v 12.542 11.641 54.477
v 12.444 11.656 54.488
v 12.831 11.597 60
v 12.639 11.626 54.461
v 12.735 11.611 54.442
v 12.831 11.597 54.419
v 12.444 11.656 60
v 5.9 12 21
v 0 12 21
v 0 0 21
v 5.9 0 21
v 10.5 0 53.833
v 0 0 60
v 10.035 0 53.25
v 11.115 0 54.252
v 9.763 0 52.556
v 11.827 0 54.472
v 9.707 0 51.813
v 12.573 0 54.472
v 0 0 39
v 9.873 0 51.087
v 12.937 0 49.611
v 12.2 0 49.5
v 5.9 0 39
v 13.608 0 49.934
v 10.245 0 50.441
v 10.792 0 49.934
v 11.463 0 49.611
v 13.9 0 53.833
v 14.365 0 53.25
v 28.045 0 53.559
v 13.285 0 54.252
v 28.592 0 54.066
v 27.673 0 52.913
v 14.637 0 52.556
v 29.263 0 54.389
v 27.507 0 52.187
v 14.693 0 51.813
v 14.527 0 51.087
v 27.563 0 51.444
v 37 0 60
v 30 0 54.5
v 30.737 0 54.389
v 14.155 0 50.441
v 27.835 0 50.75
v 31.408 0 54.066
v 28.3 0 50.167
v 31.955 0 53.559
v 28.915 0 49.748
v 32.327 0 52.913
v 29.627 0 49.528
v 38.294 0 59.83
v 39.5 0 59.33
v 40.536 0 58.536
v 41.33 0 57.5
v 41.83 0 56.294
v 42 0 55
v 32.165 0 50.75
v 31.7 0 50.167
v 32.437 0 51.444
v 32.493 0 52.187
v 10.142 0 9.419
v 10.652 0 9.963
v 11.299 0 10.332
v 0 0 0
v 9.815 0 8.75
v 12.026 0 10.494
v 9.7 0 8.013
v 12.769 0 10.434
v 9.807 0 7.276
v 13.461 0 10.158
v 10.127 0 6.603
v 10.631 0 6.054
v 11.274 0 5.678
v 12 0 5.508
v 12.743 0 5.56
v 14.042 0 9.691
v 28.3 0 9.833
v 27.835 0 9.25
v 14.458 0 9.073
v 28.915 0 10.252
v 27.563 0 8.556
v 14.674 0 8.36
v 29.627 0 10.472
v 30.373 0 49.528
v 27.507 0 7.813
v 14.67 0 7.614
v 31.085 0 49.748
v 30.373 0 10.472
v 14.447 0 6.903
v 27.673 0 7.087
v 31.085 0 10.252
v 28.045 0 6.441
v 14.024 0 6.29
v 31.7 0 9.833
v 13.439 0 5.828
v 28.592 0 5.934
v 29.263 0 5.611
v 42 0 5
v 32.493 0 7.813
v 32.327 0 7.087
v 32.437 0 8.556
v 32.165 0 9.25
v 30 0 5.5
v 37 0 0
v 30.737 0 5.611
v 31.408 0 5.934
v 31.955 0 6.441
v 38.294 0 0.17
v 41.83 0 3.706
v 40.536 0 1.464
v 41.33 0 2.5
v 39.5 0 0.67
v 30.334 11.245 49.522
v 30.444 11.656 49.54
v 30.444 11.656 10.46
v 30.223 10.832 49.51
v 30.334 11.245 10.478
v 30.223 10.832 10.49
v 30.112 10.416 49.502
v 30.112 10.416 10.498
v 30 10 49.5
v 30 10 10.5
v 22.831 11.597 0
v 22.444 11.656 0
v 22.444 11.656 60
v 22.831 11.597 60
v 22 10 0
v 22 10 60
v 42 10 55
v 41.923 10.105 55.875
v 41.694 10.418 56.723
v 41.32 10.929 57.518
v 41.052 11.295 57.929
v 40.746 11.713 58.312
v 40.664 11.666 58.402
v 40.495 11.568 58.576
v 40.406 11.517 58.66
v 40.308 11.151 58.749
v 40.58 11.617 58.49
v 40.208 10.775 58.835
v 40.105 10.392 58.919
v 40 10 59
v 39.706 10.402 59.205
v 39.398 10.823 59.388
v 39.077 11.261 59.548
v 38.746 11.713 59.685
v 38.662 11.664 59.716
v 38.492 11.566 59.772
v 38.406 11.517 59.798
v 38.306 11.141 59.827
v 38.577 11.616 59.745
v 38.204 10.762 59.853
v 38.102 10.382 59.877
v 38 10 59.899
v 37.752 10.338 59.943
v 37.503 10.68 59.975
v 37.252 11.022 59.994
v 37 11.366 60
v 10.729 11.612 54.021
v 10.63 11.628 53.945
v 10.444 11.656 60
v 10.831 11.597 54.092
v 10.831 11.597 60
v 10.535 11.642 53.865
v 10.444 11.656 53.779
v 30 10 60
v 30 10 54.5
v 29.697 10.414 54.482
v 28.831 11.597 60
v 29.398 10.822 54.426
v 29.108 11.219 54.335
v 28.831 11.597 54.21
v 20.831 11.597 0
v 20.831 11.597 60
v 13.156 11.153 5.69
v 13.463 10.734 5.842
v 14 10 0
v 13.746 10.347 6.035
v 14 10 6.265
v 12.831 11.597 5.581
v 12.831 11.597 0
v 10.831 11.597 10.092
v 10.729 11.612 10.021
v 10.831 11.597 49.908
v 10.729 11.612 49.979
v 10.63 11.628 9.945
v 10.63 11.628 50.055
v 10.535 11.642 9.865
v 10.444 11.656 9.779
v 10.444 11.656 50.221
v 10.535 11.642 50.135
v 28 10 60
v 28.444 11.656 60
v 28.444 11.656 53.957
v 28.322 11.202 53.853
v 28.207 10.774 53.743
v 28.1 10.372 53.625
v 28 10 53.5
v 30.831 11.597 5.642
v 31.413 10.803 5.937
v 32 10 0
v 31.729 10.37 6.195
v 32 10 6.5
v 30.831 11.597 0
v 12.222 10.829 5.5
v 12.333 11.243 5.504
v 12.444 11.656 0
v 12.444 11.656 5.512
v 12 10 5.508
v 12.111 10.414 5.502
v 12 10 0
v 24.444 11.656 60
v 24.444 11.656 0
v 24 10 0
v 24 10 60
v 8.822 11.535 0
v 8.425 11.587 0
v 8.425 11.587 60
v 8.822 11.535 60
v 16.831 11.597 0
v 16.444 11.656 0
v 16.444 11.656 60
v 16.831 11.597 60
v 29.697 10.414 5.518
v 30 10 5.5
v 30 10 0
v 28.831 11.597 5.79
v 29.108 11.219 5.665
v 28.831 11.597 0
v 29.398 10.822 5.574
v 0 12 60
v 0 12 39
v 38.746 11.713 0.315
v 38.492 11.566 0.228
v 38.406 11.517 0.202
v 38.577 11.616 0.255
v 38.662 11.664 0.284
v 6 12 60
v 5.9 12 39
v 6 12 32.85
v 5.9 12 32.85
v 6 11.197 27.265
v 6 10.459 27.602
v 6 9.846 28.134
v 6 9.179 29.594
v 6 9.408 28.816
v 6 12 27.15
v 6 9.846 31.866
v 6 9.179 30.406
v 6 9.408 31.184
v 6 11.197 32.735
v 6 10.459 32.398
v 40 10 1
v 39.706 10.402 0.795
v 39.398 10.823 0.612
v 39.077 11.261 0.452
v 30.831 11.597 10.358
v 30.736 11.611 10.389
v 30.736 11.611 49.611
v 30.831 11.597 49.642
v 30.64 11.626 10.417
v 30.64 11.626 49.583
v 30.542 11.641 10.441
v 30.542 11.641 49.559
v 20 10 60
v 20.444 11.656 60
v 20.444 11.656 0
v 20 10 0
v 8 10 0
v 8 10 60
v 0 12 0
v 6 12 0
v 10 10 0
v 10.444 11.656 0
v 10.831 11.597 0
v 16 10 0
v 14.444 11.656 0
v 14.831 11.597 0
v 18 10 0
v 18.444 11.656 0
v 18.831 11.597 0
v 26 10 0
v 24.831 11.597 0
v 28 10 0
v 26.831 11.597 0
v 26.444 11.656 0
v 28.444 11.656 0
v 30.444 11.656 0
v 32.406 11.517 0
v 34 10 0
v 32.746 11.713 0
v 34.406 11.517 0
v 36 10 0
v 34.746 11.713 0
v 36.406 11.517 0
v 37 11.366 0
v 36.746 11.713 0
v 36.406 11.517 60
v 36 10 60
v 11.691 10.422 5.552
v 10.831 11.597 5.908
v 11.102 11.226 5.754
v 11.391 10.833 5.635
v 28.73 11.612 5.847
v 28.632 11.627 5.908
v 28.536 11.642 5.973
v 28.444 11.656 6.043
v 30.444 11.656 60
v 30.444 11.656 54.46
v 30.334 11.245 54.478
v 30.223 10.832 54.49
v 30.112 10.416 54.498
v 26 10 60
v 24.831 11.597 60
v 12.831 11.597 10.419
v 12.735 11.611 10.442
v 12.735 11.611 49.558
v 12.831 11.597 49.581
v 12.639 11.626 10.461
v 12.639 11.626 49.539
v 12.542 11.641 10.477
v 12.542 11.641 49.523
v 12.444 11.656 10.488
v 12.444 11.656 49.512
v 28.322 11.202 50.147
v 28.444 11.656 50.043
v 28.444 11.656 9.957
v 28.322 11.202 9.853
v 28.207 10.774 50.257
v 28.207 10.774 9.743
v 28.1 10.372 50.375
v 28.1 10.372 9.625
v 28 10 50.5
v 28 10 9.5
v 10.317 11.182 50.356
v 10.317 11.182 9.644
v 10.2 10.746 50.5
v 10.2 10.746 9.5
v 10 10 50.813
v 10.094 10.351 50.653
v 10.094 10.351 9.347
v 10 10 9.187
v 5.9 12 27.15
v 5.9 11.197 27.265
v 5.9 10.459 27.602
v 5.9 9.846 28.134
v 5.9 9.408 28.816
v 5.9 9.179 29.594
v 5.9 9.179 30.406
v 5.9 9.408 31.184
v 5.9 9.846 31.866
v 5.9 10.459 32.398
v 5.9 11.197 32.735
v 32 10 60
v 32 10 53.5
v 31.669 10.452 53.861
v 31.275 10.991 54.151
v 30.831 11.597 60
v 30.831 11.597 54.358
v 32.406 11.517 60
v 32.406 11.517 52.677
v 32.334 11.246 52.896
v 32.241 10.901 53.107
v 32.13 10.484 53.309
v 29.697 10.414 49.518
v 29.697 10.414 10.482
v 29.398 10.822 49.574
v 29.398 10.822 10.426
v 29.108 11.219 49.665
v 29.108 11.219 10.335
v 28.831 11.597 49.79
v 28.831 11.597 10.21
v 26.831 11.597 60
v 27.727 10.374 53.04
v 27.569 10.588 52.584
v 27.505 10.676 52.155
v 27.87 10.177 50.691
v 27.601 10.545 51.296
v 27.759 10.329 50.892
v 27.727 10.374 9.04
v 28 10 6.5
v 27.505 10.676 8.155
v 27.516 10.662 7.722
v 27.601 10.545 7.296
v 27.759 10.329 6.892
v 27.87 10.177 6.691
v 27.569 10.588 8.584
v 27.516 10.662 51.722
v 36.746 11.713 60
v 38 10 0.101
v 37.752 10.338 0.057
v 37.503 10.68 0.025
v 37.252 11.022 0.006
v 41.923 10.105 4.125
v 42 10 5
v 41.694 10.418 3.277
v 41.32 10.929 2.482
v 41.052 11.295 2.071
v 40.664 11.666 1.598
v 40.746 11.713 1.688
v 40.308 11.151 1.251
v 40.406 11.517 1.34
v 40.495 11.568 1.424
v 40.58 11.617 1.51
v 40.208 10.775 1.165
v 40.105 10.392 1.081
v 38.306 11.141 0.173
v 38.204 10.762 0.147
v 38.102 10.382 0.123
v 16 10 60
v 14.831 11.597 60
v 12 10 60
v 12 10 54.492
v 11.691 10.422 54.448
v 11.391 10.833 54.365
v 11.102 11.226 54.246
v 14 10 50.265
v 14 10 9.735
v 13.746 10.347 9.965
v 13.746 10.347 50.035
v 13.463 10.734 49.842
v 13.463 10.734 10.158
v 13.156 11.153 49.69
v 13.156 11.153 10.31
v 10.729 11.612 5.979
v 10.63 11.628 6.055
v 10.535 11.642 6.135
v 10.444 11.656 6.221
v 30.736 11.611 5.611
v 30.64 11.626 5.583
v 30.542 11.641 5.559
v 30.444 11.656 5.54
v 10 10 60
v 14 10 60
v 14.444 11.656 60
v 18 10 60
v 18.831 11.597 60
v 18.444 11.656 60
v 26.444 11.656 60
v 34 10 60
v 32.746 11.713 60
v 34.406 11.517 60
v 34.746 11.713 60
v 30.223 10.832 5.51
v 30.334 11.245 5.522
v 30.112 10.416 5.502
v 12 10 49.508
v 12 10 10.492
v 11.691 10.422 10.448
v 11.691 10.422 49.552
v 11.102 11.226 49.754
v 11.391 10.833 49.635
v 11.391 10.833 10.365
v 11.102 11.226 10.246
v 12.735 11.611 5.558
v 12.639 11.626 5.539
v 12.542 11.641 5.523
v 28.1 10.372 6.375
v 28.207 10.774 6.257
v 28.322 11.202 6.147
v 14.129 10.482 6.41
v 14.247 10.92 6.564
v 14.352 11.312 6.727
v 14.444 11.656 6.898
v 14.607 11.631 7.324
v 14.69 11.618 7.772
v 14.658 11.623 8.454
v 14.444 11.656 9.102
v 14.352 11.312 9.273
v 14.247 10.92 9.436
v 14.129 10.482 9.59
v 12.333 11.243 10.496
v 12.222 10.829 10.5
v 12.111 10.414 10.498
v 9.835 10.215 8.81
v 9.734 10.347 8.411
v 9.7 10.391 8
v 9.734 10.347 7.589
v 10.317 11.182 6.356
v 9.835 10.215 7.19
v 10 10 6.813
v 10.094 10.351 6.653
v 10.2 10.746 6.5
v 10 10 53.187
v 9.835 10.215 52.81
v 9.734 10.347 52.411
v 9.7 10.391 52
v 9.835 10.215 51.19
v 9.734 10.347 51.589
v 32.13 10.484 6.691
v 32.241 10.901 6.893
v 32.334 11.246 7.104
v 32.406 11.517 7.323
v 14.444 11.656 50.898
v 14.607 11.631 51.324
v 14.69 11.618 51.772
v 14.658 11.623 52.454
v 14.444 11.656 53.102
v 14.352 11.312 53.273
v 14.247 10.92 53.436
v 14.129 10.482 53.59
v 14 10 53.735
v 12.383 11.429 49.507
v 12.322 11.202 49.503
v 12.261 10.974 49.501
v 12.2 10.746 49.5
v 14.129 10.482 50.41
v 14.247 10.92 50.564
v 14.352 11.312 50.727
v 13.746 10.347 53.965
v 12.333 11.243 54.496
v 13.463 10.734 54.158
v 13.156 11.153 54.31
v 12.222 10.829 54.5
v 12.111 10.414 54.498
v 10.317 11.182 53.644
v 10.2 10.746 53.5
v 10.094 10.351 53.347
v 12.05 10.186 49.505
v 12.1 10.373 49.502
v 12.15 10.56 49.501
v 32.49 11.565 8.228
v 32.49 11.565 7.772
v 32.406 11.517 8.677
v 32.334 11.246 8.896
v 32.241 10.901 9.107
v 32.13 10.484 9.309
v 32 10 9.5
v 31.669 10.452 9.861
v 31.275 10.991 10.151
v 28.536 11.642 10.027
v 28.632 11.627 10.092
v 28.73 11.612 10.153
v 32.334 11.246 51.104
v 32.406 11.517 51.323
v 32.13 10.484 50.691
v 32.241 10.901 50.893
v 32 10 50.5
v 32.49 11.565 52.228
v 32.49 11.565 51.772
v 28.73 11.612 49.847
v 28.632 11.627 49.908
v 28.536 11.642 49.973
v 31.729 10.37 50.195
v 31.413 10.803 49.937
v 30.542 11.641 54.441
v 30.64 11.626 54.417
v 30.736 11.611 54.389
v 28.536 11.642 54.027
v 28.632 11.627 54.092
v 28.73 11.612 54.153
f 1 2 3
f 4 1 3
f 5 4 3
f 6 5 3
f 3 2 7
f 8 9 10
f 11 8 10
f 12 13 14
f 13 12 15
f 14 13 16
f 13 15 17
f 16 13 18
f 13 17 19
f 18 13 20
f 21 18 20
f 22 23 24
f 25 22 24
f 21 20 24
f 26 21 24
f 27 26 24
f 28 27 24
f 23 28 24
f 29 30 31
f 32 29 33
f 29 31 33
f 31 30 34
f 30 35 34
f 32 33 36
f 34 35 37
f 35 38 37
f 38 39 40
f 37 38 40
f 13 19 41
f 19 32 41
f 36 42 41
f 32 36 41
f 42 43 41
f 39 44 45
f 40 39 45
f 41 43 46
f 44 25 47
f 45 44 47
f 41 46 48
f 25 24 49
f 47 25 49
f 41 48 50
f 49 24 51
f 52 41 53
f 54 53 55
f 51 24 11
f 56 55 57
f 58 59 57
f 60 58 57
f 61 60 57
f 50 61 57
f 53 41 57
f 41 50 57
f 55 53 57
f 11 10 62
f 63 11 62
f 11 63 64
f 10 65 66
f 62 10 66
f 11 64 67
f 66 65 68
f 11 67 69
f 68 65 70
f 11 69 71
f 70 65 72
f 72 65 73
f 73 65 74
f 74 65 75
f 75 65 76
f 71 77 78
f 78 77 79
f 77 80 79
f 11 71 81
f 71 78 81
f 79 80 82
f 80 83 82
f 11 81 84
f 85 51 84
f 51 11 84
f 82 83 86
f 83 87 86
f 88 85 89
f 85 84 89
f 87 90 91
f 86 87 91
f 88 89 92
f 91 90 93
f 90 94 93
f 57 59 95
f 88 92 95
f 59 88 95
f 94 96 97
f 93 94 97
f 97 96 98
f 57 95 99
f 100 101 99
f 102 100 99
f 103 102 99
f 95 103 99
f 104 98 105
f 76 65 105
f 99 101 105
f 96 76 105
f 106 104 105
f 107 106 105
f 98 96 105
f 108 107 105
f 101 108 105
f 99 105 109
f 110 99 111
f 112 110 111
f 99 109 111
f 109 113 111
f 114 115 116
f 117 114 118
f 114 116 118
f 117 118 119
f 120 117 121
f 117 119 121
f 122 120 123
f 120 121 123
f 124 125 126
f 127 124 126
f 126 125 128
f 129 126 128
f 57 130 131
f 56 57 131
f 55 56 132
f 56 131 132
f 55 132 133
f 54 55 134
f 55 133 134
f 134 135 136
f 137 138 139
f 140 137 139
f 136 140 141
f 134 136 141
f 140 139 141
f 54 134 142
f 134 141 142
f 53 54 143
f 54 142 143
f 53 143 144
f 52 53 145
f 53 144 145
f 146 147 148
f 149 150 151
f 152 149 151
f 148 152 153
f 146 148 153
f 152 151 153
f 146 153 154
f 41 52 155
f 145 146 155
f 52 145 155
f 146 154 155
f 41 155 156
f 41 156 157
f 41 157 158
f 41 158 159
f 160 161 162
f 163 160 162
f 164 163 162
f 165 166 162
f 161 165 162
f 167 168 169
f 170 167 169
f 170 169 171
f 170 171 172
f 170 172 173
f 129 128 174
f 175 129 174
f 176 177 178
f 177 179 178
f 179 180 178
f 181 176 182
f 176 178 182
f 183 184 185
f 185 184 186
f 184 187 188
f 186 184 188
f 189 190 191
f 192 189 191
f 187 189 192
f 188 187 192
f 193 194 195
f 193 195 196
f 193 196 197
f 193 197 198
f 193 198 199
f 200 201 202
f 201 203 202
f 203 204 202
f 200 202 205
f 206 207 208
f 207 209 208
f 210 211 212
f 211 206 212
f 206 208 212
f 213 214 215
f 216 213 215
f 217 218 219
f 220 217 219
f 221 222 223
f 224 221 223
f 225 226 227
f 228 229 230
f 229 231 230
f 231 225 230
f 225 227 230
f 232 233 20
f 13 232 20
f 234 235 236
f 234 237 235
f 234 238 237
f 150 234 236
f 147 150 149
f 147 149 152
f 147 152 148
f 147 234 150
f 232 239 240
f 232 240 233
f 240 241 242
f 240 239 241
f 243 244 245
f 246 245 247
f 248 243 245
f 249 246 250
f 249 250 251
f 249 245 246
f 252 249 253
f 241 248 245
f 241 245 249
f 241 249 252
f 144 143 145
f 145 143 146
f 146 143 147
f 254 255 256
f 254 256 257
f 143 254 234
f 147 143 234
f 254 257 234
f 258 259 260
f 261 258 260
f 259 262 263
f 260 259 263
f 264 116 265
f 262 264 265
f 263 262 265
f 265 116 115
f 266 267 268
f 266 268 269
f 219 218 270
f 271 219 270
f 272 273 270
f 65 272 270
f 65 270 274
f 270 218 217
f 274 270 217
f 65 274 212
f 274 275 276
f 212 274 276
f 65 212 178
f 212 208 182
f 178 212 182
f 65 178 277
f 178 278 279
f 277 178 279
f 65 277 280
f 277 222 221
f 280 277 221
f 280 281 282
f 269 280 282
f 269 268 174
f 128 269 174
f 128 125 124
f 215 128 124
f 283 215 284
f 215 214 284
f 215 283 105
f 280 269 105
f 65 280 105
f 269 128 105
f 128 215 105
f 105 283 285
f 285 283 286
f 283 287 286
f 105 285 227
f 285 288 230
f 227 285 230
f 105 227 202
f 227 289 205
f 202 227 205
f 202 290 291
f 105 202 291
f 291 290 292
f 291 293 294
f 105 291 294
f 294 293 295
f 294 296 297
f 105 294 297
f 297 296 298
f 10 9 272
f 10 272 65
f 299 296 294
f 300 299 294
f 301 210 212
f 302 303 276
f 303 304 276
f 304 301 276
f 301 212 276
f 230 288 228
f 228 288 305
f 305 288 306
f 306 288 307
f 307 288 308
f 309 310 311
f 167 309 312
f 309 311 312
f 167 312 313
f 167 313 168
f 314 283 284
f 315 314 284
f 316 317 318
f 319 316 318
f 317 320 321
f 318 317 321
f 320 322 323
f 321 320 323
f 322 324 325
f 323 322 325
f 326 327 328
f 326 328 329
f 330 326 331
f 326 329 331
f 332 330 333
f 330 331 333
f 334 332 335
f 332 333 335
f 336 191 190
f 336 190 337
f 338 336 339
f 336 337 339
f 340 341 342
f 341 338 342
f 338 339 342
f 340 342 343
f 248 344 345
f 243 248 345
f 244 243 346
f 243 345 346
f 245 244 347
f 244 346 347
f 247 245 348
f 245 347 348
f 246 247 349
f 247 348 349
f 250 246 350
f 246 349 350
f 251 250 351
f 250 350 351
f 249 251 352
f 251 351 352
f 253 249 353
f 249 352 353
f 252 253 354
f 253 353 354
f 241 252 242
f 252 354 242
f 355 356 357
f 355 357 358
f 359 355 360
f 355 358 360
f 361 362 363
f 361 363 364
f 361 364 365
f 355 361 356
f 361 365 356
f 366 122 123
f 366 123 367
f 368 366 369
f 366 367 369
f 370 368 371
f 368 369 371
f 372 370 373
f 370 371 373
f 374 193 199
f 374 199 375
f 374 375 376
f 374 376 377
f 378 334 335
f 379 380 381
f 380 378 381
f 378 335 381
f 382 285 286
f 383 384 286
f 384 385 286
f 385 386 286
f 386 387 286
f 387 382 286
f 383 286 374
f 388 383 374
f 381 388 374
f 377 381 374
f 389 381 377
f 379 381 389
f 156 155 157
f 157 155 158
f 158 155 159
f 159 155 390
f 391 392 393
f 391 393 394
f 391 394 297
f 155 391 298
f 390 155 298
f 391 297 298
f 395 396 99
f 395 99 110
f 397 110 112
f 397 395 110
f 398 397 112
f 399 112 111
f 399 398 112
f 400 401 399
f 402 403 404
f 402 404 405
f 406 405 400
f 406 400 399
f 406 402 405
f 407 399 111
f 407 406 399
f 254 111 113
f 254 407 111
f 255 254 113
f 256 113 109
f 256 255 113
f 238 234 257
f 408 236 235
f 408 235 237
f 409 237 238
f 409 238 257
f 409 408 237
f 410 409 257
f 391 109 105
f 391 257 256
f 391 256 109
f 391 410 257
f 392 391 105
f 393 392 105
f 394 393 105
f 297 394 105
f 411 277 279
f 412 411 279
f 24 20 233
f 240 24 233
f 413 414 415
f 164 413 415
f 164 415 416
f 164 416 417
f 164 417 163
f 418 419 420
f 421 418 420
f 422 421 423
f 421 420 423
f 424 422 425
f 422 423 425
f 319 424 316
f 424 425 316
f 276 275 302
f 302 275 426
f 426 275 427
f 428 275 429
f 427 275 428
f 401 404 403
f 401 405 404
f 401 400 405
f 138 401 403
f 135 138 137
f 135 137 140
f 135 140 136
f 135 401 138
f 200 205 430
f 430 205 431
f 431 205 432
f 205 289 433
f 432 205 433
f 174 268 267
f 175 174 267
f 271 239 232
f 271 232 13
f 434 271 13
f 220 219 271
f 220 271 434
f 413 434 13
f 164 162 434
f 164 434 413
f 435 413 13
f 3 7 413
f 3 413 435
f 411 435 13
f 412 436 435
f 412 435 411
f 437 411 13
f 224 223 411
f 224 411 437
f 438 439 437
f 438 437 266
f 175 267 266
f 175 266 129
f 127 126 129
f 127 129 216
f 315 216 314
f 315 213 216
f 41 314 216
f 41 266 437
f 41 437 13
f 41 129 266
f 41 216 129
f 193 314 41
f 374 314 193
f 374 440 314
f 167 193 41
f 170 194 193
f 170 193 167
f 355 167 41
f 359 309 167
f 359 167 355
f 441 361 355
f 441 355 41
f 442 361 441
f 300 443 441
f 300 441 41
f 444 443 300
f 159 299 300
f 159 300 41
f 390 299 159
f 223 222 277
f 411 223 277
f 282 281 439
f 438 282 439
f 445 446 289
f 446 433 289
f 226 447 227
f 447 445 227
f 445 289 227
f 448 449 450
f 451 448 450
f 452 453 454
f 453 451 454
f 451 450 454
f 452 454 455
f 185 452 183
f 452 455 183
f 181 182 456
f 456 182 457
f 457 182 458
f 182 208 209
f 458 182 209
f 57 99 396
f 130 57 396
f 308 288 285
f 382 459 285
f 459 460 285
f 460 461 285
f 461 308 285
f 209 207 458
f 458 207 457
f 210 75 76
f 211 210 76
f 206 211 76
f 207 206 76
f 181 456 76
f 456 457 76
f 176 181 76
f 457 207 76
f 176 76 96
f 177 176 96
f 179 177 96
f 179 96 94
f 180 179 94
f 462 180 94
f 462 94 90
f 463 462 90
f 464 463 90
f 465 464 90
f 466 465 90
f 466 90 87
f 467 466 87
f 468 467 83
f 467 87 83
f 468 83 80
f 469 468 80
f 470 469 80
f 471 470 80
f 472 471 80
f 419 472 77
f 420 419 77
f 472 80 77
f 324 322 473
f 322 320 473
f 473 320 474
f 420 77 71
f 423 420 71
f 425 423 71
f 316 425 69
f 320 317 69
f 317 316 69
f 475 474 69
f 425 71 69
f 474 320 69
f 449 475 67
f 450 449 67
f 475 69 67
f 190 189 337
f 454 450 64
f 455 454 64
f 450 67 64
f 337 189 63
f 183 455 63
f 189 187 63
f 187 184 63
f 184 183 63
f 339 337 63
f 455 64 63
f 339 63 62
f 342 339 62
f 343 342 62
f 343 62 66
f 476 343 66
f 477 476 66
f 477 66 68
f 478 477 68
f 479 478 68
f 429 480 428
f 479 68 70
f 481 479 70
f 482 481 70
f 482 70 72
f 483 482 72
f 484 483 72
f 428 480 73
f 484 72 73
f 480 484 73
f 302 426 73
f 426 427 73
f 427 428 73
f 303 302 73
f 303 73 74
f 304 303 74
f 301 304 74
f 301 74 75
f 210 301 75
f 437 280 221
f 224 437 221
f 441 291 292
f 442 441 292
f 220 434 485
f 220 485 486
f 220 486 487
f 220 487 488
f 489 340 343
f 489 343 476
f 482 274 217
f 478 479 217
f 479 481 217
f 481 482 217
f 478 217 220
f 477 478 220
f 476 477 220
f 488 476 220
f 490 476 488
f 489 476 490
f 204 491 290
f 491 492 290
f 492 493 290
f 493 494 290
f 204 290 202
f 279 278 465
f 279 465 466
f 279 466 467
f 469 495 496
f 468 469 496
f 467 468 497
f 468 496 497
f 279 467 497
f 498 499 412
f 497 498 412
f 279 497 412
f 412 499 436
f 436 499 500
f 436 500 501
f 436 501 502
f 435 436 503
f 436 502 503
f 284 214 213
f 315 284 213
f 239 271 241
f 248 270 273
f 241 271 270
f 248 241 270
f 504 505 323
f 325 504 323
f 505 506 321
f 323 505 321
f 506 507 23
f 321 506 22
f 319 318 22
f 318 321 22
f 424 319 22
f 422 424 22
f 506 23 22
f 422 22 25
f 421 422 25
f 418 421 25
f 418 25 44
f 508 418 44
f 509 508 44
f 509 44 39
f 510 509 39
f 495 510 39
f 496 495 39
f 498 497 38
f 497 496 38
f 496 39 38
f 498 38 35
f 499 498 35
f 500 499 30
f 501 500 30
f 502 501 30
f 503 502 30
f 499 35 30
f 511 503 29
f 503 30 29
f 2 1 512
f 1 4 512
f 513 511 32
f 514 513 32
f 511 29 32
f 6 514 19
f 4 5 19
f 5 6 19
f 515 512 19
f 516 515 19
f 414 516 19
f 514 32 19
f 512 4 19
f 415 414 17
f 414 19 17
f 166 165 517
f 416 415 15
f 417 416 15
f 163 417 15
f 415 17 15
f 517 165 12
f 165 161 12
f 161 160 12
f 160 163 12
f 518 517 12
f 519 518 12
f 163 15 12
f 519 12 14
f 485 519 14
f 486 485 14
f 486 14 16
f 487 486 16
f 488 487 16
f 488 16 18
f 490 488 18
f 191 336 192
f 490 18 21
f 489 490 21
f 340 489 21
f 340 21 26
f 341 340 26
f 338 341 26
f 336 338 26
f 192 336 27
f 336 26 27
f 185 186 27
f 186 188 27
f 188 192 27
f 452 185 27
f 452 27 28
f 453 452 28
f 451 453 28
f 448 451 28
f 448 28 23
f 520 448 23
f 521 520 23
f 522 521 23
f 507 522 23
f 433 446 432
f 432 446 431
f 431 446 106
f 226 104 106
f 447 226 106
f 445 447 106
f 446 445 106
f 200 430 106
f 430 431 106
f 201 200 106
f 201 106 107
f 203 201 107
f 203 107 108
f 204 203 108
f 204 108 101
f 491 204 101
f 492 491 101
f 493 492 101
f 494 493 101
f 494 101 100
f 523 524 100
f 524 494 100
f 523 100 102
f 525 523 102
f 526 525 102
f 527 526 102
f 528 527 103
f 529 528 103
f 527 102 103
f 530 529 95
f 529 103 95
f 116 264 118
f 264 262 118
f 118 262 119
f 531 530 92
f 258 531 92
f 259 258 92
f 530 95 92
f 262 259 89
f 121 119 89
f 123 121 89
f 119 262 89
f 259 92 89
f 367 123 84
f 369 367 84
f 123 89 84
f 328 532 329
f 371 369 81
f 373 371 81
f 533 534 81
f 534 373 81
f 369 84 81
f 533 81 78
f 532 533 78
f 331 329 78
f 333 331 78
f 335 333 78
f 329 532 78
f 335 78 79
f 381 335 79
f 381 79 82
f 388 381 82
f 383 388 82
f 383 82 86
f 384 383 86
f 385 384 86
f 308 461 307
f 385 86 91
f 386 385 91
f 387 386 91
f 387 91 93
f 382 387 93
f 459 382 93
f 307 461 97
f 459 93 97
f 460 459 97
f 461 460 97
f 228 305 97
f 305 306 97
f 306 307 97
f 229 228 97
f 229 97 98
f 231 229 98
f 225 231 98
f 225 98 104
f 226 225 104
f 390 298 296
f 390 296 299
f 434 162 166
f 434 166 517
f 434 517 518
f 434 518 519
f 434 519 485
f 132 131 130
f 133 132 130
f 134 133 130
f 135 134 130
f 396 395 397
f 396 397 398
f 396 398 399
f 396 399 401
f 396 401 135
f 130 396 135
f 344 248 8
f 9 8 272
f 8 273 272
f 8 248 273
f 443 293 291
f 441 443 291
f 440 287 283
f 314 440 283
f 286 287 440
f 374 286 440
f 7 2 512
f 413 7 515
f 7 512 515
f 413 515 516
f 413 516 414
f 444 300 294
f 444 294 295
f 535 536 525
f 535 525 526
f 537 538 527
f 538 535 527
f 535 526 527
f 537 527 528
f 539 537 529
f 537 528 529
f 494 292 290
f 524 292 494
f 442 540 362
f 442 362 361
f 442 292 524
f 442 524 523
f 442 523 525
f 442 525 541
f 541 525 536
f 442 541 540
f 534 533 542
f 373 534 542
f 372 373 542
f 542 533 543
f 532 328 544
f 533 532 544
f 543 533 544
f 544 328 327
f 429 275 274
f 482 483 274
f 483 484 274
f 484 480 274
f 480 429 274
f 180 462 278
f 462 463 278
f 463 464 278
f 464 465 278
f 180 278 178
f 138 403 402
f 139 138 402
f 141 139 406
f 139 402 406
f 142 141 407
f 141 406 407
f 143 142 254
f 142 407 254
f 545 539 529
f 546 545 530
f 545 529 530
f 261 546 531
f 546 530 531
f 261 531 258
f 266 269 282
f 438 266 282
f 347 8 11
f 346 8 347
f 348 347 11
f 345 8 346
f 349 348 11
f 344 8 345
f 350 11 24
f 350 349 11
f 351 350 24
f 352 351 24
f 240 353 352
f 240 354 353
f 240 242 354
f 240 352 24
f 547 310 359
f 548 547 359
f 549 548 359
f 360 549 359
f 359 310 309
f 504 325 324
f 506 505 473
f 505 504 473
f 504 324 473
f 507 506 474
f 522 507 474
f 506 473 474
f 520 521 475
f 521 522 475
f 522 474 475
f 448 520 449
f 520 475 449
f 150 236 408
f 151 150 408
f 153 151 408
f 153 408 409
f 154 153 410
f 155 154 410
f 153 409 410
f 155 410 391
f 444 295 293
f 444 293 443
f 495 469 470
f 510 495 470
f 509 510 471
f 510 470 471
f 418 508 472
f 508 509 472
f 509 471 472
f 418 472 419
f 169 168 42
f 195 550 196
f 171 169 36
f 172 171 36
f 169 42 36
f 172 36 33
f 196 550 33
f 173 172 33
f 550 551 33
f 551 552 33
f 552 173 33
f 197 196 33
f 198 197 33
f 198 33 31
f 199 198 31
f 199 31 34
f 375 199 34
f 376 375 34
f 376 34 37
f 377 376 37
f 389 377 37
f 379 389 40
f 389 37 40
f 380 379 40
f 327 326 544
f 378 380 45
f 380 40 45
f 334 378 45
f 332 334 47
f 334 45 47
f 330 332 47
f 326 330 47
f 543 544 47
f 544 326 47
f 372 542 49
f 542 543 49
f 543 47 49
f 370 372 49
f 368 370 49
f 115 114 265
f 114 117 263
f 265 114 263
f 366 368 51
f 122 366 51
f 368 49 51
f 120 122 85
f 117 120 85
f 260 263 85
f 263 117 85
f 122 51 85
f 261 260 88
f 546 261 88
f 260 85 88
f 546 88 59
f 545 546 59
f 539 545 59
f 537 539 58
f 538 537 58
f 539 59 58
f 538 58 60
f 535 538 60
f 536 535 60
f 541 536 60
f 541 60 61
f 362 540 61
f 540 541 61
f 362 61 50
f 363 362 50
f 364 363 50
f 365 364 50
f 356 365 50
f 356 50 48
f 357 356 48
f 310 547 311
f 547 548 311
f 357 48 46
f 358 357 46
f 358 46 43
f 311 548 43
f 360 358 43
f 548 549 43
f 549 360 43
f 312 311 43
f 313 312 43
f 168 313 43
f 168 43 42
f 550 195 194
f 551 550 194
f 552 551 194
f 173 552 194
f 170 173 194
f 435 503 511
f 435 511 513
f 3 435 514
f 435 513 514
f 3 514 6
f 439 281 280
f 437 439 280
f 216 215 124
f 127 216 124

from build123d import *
from OCP.BRepFilletAPI import BRepFilletAPI_MakeChamfer

# Parameters (mm, degrees)
EXTRUDE_1_DEPTH     = 60
FILLET_1_R          = 5
CUT_EXTRUDE_1_DEPTH = 5.9
CHAMFER_1_SIZE      = 0.5
CHAMFER_1_SIZE2     = 0.355637567
CHAMFER_1_SIZE2_2   = 0.356604189
SKETCH_6_R          = 2.85
CUT_EXTRUDE_2_DEPTH = 0.1
SKETCH_7_R          = 2.5
CUT_EXTRUDE_3_DEPTH = 75.215901261


with BuildPart() as part:
    # 草图1 → 凸台-拉伸1 (new body)
    with BuildSketch(Plane.XY):
        Polygon((0, 0), (42, 0), (42, 10), (40.535898385, 12), (40, 10), (38.535898385, 12), (38, 10), (36.535898385, 12), (36, 10), (34.535898385, 12), (34, 10), (32.535898385, 12), (32, 10), (30.535898385, 12), (30, 10), (28.535898385, 12), (28, 10), (26.535898385, 12), (26, 10), (24.535898385, 12), (24, 10), (22.535898385, 12), (22, 10), (20.535898385, 12), (20, 10), (18.535898385, 12), (18, 10), (16.535898385, 12), (16, 10), (14.535898385, 12), (14, 10), (12.535898385, 12), (12, 10), (10.535898385, 12), (10, 10), (8.51763809, 11.931851653), (8, 10), (6, 12), (0, 12), align=None)
    extrude(amount=EXTRUDE_1_DEPTH)

    # 圆角1
    fillet_1_edges = [part.edges().sort_by_distance(p)[0] for p in [
        (42, 5, 0),
        (42, 5, 60),
    ]]
    fillet(fillet_1_edges, radius=FILLET_1_R)

    # 草图2 → 切除-拉伸1 (cut)
    with BuildSketch(Plane.ZY):
        with BuildLine():
            ThreePointArc((32.9, 12), (32.050609665, 9.949390335), (30, 9.1))
            Line((30, 9.1), (30, 0))
            Line((30, 0), (39, 0))
            Line((39, 0), (39, 12))
            Line((39, 12), (32.9, 12))
        make_face()
        with BuildLine():
            Line((30, 0), (30, 9.1))
            ThreePointArc((30, 9.1), (27.949390335, 9.949390335), (27.1, 12))
            Line((27.1, 12), (21, 12))
            Line((21, 12), (21, 0))
            Line((21, 0), (30, 0))
        make_face()
        with BuildLine():
            Line((32.9, 12), (30, 12))
            Line((30, 12), (30, 9.1))
            ThreePointArc((30, 9.1), (32.050609665, 9.949390335), (32.9, 12))
        make_face()
        with BuildLine():
            Line((30, 9.1), (30, 12))
            Line((30, 12), (27.1, 12))
            ThreePointArc((27.1, 12), (27.949390335, 9.949390335), (30, 9.1))
        make_face()
    extrude(amount=-CUT_EXTRUDE_1_DEPTH, mode=Mode.SUBTRACT)

    # 倒角1: one chamfer whose edges measure the first distance from different faces: ONE call of the kernel's chamfer builder (chamfer() names one face for all edges)
    chamfer_1_edges_1 = [part.edges().sort_by_distance(p)[0] for p in [
        (40.535898385, 12, 30),
    ]]
    chamfer_1_side_1 = [part.faces().sort_by_distance(p)[0] for p in [
        (40.267229154, 10.997312779, 30),
    ]]
    chamfer_1_edges_2 = [part.edges().sort_by_distance(p)[0] for p in [
        (38.535898385, 12, 30),
    ]]
    chamfer_1_side_2 = [part.faces().sort_by_distance(p)[0] for p in [
        (38.267738685, 10.999214377, 30),
    ]]
    chamfer_1_edges_3 = [part.edges().sort_by_distance(p)[0] for p in [
        (36.535898385, 12, 30),
    ]]
    chamfer_1_side_3 = [part.faces().sort_by_distance(p)[0] for p in [
        (36.267949192, 11, 30),
    ]]
    chamfer_1_edges_4 = [part.edges().sort_by_distance(p)[0] for p in [
        (34.535898385, 12, 30),
    ]]
    chamfer_1_side_4 = [part.faces().sort_by_distance(p)[0] for p in [
        (34.267949192, 11, 30),
    ]]
    chamfer_1_edges_5 = [part.edges().sort_by_distance(p)[0] for p in [
        (32.535898385, 12, 30),
    ]]
    chamfer_1_side_5 = [part.faces().sort_by_distance(p)[0] for p in [
        (32.267949192, 11, 30),
    ]]
    chamfer_1_edges_6 = [part.edges().sort_by_distance(p)[0] for p in [
        (30.535898385, 12, 30),
    ]]
    chamfer_1_side_6 = [part.faces().sort_by_distance(p)[0] for p in [
        (31.267949192, 11, 30),
    ]]
    chamfer_1_edges_7 = [part.edges().sort_by_distance(p)[0] for p in [
        (28.535898385, 12, 30),
    ]]
    chamfer_1_side_7 = [part.faces().sort_by_distance(p)[0] for p in [
        (29.267949192, 11, 30),
    ]]
    chamfer_1_edges_8 = [part.edges().sort_by_distance(p)[0] for p in [
        (26.535898385, 12, 30),
    ]]
    chamfer_1_side_8 = [part.faces().sort_by_distance(p)[0] for p in [
        (27.267949192, 11, 30),
    ]]
    chamfer_1_edges_9 = [part.edges().sort_by_distance(p)[0] for p in [
        (24.535898385, 12, 30),
    ]]
    chamfer_1_side_9 = [part.faces().sort_by_distance(p)[0] for p in [
        (25.267949192, 11, 30),
    ]]
    chamfer_1_edges_10 = [part.edges().sort_by_distance(p)[0] for p in [
        (22.535898385, 12, 30),
    ]]
    chamfer_1_side_10 = [part.faces().sort_by_distance(p)[0] for p in [
        (23.267949192, 11, 30),
    ]]
    chamfer_1_edges_11 = [part.edges().sort_by_distance(p)[0] for p in [
        (20.535898385, 12, 30),
    ]]
    chamfer_1_side_11 = [part.faces().sort_by_distance(p)[0] for p in [
        (21.267949192, 11, 30),
    ]]
    chamfer_1_edges_12 = [part.edges().sort_by_distance(p)[0] for p in [
        (18.535898385, 12, 30),
    ]]
    chamfer_1_side_12 = [part.faces().sort_by_distance(p)[0] for p in [
        (19.267949192, 11, 30),
    ]]
    chamfer_1_edges_13 = [part.edges().sort_by_distance(p)[0] for p in [
        (16.535898385, 12, 30),
    ]]
    chamfer_1_side_13 = [part.faces().sort_by_distance(p)[0] for p in [
        (17.267949192, 11, 30),
    ]]
    chamfer_1_edges_14 = [part.edges().sort_by_distance(p)[0] for p in [
        (14.535898385, 12, 30),
    ]]
    chamfer_1_side_14 = [part.faces().sort_by_distance(p)[0] for p in [
        (15.267949192, 11, 30),
    ]]
    chamfer_1_edges_15 = [part.edges().sort_by_distance(p)[0] for p in [
        (12.535898385, 12, 30),
    ]]
    chamfer_1_side_15 = [part.faces().sort_by_distance(p)[0] for p in [
        (13.267949192, 11, 30),
    ]]
    chamfer_1_edges_16 = [part.edges().sort_by_distance(p)[0] for p in [
        (10.535898385, 12, 30),
    ]]
    chamfer_1_side_16 = [part.faces().sort_by_distance(p)[0] for p in [
        (11.267949192, 11, 30),
    ]]
    chamfer_1_edges_17 = [part.edges().sort_by_distance(p)[0] for p in [
        (8.51763809, 11.931851653, 30),
    ]]
    chamfer_1_side_17 = [part.faces().sort_by_distance(p)[0] for p in [
        (9.258819045, 10.965925826, 30),
    ]]
    chamfer_1 = BRepFilletAPI_MakeChamfer(part.part.solid().wrapped)
    for e in chamfer_1_edges_1:
        chamfer_1.Add(CHAMFER_1_SIZE, CHAMFER_1_SIZE2, e.wrapped, chamfer_1_side_1[0].wrapped)  # the first distance lies on this face
    for e in chamfer_1_edges_2:
        chamfer_1.Add(CHAMFER_1_SIZE, CHAMFER_1_SIZE2, e.wrapped, chamfer_1_side_2[0].wrapped)  # the first distance lies on this face
    for e in chamfer_1_edges_3:
        chamfer_1.Add(CHAMFER_1_SIZE, CHAMFER_1_SIZE2, e.wrapped, chamfer_1_side_3[0].wrapped)  # the first distance lies on this face
    for e in chamfer_1_edges_4:
        chamfer_1.Add(CHAMFER_1_SIZE, CHAMFER_1_SIZE2, e.wrapped, chamfer_1_side_4[0].wrapped)  # the first distance lies on this face
    for e in chamfer_1_edges_5:
        chamfer_1.Add(CHAMFER_1_SIZE, CHAMFER_1_SIZE2, e.wrapped, chamfer_1_side_5[0].wrapped)  # the first distance lies on this face
    for e in chamfer_1_edges_6:
        chamfer_1.Add(CHAMFER_1_SIZE, CHAMFER_1_SIZE2, e.wrapped, chamfer_1_side_6[0].wrapped)  # the first distance lies on this face
    for e in chamfer_1_edges_7:
        chamfer_1.Add(CHAMFER_1_SIZE, CHAMFER_1_SIZE2, e.wrapped, chamfer_1_side_7[0].wrapped)  # the first distance lies on this face
    for e in chamfer_1_edges_8:
        chamfer_1.Add(CHAMFER_1_SIZE, CHAMFER_1_SIZE2, e.wrapped, chamfer_1_side_8[0].wrapped)  # the first distance lies on this face
    for e in chamfer_1_edges_9:
        chamfer_1.Add(CHAMFER_1_SIZE, CHAMFER_1_SIZE2, e.wrapped, chamfer_1_side_9[0].wrapped)  # the first distance lies on this face
    for e in chamfer_1_edges_10:
        chamfer_1.Add(CHAMFER_1_SIZE, CHAMFER_1_SIZE2, e.wrapped, chamfer_1_side_10[0].wrapped)  # the first distance lies on this face
    for e in chamfer_1_edges_11:
        chamfer_1.Add(CHAMFER_1_SIZE, CHAMFER_1_SIZE2, e.wrapped, chamfer_1_side_11[0].wrapped)  # the first distance lies on this face
    for e in chamfer_1_edges_12:
        chamfer_1.Add(CHAMFER_1_SIZE, CHAMFER_1_SIZE2, e.wrapped, chamfer_1_side_12[0].wrapped)  # the first distance lies on this face
    for e in chamfer_1_edges_13:
        chamfer_1.Add(CHAMFER_1_SIZE, CHAMFER_1_SIZE2, e.wrapped, chamfer_1_side_13[0].wrapped)  # the first distance lies on this face
    for e in chamfer_1_edges_14:
        chamfer_1.Add(CHAMFER_1_SIZE, CHAMFER_1_SIZE2, e.wrapped, chamfer_1_side_14[0].wrapped)  # the first distance lies on this face
    for e in chamfer_1_edges_15:
        chamfer_1.Add(CHAMFER_1_SIZE, CHAMFER_1_SIZE2, e.wrapped, chamfer_1_side_15[0].wrapped)  # the first distance lies on this face
    for e in chamfer_1_edges_16:
        chamfer_1.Add(CHAMFER_1_SIZE, CHAMFER_1_SIZE2, e.wrapped, chamfer_1_side_16[0].wrapped)  # the first distance lies on this face
    for e in chamfer_1_edges_17:
        chamfer_1.Add(CHAMFER_1_SIZE, CHAMFER_1_SIZE2_2, e.wrapped, chamfer_1_side_17[0].wrapped)  # the first distance lies on this face
    add(Compound.cast(chamfer_1.Shape()), mode=Mode.REPLACE)

    # 草图6 → 切除-拉伸2 (cut)
    with BuildSketch(Plane.ZY.offset(-5.9)):
        with Locations((30, 12)):
            Circle(SKETCH_6_R)
    extrude(amount=-CUT_EXTRUDE_2_DEPTH, mode=Mode.SUBTRACT)

    # 草图7 → 切除-拉伸3 (cut, through all)
    with BuildSketch(Plane.XZ):
        with Locations(Location((12.2, 52, 0), (0, 0, 270))):
            Circle(SKETCH_7_R)
        with Locations(Location((30, 52, 0), (0, 0, 90))):
            Circle(SKETCH_7_R)
        with Locations(Location((30, 8, 0), (0, 0, 270))):
            Circle(SKETCH_7_R)
        with Locations(Location((12.2, 8, 0), (0, 0, 265.411434264))):
            Circle(SKETCH_7_R)
    extrude(amount=-CUT_EXTRUDE_3_DEPTH, mode=Mode.SUBTRACT)


solid = part.part
